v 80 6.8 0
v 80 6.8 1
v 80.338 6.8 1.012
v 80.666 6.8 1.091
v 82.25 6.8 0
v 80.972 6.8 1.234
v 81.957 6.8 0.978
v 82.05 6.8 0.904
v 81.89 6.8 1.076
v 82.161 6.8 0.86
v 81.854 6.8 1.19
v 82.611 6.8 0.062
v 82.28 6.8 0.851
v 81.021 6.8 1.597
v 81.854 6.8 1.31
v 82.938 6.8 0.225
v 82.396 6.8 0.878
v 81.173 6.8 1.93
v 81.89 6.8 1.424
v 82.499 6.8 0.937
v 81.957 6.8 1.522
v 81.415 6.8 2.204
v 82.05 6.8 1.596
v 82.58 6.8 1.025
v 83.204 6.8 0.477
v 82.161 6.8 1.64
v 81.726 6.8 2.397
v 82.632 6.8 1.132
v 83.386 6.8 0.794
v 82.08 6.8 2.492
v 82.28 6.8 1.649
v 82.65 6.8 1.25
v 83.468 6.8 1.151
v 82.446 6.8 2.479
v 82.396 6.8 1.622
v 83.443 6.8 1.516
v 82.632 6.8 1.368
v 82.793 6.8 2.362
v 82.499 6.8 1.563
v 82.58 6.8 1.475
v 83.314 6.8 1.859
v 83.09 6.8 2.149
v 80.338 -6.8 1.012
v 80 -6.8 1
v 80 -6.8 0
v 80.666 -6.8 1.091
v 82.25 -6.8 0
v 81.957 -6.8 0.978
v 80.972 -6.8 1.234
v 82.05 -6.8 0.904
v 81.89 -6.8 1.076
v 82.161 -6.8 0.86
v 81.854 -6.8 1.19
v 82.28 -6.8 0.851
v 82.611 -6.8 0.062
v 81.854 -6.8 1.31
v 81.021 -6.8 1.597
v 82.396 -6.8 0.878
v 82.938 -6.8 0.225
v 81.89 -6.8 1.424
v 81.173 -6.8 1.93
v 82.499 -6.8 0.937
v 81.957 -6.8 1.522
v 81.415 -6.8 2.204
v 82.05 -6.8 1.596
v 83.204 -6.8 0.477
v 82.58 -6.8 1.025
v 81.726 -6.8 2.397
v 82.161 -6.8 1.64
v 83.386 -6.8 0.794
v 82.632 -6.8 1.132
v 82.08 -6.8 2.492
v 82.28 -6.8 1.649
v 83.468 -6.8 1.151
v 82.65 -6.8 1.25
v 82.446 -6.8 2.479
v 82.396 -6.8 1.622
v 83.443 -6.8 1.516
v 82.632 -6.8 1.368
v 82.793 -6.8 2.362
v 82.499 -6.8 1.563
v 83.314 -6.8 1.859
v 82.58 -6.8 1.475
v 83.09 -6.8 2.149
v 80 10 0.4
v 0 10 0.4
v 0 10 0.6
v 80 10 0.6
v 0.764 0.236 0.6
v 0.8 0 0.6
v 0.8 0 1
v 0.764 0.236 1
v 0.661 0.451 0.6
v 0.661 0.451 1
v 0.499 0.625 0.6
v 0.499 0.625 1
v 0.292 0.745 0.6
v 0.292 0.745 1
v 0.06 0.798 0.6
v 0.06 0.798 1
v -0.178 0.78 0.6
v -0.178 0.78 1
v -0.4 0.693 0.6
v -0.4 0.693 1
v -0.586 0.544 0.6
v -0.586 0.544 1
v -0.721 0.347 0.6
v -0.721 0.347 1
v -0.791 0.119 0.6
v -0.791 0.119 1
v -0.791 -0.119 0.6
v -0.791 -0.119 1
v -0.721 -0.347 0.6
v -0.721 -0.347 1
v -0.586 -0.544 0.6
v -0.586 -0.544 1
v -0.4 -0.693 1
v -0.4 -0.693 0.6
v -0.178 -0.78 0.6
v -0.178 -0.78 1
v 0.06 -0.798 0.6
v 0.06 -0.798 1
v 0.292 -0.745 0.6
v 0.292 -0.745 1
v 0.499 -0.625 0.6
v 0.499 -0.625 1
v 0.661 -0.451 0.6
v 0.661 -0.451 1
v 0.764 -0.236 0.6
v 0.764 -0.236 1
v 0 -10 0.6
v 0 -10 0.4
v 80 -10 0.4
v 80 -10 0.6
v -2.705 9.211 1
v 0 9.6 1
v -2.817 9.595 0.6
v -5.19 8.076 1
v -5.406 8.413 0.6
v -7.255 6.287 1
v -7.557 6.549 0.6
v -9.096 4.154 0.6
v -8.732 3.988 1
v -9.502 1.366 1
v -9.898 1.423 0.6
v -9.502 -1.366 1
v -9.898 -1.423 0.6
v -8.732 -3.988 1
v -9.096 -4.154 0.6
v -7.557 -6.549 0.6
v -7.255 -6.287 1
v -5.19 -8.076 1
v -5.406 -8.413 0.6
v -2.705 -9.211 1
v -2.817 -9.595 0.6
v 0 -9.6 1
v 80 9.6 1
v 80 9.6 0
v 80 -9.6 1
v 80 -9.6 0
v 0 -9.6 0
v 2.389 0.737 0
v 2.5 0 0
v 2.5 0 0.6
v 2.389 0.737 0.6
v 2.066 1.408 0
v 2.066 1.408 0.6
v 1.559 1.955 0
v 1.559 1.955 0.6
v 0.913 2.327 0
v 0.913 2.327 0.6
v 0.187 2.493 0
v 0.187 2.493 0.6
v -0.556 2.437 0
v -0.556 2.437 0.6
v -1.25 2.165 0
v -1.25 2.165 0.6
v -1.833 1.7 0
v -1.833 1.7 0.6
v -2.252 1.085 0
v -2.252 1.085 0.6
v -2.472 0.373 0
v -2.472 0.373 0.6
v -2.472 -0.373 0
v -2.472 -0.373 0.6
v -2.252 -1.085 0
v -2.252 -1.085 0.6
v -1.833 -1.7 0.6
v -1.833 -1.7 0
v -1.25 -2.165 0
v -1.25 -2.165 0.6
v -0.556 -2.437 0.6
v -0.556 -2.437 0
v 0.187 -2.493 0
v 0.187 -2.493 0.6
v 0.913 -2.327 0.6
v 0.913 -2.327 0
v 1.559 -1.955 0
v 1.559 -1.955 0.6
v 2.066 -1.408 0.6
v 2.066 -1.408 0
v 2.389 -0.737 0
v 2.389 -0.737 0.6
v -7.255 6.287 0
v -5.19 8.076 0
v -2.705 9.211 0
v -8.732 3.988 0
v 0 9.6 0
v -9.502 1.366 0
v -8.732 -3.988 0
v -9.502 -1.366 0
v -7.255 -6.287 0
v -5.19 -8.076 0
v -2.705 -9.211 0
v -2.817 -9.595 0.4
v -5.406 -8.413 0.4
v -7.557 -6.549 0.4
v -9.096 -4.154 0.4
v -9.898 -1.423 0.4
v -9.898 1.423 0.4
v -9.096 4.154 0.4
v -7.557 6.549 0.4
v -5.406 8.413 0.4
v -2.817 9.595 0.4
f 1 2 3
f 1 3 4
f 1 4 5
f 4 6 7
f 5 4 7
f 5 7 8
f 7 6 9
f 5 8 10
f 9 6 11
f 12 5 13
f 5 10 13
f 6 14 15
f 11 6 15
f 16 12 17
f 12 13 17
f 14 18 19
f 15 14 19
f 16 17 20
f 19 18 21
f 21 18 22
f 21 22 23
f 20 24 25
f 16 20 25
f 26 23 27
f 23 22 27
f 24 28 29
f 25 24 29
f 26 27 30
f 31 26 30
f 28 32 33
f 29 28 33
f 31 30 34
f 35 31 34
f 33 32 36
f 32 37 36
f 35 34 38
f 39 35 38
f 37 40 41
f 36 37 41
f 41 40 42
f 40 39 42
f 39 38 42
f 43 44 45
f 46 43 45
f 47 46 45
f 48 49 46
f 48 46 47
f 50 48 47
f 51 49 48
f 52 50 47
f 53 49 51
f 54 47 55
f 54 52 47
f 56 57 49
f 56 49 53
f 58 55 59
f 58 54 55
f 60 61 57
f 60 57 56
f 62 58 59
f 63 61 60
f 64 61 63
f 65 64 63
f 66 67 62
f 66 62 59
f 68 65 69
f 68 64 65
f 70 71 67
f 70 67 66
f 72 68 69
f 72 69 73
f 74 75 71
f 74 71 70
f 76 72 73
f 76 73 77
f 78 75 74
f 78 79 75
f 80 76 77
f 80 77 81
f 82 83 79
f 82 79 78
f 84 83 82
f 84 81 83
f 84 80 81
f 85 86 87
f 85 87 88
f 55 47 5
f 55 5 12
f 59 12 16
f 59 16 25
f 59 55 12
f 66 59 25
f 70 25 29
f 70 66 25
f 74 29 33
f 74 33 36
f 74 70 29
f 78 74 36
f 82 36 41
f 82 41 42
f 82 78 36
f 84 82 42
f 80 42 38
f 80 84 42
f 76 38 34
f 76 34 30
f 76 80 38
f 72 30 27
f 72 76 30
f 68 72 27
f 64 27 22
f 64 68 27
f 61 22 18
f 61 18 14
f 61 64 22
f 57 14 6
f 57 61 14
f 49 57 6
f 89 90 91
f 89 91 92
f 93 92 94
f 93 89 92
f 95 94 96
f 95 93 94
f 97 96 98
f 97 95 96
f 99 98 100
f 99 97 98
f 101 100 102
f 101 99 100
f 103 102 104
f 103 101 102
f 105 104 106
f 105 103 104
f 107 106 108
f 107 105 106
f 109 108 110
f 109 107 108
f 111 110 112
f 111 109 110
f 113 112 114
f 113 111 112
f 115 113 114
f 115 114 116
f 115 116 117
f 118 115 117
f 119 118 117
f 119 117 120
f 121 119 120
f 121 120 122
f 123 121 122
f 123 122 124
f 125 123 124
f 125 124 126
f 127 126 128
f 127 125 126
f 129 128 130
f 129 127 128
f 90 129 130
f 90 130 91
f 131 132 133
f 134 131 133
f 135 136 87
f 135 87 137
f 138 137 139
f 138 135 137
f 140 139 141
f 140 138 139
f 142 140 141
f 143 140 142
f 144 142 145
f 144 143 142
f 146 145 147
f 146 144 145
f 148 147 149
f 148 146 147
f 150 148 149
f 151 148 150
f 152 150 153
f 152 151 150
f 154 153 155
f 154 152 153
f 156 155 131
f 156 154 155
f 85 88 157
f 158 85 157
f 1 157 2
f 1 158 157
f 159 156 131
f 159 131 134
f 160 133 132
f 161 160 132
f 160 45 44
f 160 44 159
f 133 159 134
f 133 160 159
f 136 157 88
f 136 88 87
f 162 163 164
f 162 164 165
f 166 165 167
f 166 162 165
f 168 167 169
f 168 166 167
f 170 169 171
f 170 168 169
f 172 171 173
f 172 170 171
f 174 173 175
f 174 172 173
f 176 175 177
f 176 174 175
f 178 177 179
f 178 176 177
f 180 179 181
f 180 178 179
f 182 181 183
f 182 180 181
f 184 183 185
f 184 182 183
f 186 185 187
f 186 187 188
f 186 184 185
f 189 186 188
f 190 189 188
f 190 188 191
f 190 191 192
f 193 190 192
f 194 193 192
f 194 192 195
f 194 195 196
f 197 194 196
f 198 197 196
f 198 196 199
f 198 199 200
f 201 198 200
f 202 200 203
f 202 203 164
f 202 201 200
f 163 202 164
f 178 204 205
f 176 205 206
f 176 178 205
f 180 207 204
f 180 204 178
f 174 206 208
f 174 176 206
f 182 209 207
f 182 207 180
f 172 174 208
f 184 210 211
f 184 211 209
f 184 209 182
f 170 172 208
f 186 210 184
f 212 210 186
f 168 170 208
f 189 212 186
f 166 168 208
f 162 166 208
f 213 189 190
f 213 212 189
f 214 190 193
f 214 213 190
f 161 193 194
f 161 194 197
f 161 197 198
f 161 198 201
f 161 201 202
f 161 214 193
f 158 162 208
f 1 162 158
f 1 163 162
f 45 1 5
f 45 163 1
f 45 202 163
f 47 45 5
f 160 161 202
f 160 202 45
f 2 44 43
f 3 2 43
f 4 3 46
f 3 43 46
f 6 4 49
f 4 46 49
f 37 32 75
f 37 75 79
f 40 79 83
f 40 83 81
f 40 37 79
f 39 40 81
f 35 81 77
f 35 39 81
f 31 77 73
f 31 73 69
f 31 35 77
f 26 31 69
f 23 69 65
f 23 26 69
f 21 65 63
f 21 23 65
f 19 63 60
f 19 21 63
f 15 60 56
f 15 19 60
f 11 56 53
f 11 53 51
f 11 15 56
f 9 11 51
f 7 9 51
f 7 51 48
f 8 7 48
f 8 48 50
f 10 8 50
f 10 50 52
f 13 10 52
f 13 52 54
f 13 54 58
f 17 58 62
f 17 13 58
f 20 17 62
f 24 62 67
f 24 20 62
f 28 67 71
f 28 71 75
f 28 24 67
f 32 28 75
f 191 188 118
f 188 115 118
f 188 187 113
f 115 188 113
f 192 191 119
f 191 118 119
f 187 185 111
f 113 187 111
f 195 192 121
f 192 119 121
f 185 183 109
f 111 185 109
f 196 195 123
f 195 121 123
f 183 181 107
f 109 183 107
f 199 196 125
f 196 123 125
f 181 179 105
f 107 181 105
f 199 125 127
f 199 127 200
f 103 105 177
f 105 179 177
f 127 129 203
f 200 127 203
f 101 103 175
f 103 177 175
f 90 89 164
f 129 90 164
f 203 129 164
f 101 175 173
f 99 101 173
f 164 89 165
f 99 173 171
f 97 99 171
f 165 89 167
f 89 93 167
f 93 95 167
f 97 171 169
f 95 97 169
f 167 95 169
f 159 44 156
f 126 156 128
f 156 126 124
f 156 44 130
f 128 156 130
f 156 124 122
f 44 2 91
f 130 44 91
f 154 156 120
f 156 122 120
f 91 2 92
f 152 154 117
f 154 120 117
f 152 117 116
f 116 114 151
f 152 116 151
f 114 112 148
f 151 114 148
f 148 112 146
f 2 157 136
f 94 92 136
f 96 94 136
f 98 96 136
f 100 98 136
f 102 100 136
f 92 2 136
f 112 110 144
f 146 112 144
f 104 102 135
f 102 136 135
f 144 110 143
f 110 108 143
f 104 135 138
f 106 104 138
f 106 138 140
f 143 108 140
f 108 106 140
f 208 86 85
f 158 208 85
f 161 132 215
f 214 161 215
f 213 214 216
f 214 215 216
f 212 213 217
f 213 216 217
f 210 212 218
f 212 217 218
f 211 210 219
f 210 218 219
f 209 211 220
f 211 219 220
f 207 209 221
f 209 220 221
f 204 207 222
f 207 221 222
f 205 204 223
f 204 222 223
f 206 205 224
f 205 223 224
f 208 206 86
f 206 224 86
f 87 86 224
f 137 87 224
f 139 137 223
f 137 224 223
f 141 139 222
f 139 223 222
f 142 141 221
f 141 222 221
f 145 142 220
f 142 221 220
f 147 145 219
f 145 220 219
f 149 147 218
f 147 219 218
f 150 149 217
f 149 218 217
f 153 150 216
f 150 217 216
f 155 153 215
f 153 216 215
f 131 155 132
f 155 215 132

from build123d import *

# Parameters (mm, degrees)
PAD_DEPTH         = 1
PAD001_DEPTH      = 6.8
PAD001_DEPTH_BACK = 6.8
CYLINDER_R        = 0.4
CYLINDER_DEPTH    = 13.6
CYLINDER003_R     = 2.5
CYLINDER003_DEPTH = 0.6
CYLINDER004_R     = 0.8
CYLINDER004_DEPTH = 0.4
CHAMFER_SIZE      = 0.4


with BuildPart() as part:
    # Sketch → Pad (new body)
    with BuildSketch(Plane.XY):
        with BuildLine():
            Line((0, 10), (80, 10))
            Line((80, 10), (80, -10))
            Line((0, -10), (80, -10))
            ThreePointArc((0, 10), (-10, 0), (0, -10))
        make_face()
    extrude(amount=PAD_DEPTH)

    # Sketch003 (on Sketch) → Pad001 (join, two sides)
    with BuildSketch(Plane.XZ) as pad001_sk:
        with BuildLine():
            Line((80, 0), (82.25, 0))
            ThreePointArc((82.25, 0), (83.090481, 2.14888), (80.972274, 1.233843))
            ThreePointArc((80, 1), (80.503859, 1.043236), (80.972274, 1.233843))
            Line((80, 1), (80, 0))
        make_face()
    extrude(amount=PAD001_DEPTH)
    extrude(pad001_sk.sketch, amount=-PAD001_DEPTH_BACK)

    # Cylinder → Cylinder (cut)
    with BuildSketch(Plane(origin=(82.25, 6.8, 1.25), x_dir=(1, 0, 0), z_dir=(0, -1, 0))):
        Circle(CYLINDER_R)
    extrude(amount=CYLINDER_DEPTH, mode=Mode.SUBTRACT)

    # Cylinder003 → Cylinder003 (cut)
    with BuildSketch(Plane.XY):
        Circle(CYLINDER003_R)
    extrude(amount=CYLINDER003_DEPTH, mode=Mode.SUBTRACT)

    # Cylinder004 → Cylinder004 (cut)
    with BuildSketch(Plane.XY.offset(0.6)):
        Circle(CYLINDER004_R)
    extrude(amount=CYLINDER004_DEPTH, mode=Mode.SUBTRACT)

    # Chamfer
    chamfer_edges = [part.edges().sort_by_distance(p)[0] for p in [
        (40, -10, 1),
        (-10, 0, 1),
        (40, 10, 1),
        (40, 10, 0),
        (-10, 0, 0),
        (40, -10, 0),
    ]]
    chamfer(chamfer_edges, length=CHAMFER_SIZE)


solid = part.part
